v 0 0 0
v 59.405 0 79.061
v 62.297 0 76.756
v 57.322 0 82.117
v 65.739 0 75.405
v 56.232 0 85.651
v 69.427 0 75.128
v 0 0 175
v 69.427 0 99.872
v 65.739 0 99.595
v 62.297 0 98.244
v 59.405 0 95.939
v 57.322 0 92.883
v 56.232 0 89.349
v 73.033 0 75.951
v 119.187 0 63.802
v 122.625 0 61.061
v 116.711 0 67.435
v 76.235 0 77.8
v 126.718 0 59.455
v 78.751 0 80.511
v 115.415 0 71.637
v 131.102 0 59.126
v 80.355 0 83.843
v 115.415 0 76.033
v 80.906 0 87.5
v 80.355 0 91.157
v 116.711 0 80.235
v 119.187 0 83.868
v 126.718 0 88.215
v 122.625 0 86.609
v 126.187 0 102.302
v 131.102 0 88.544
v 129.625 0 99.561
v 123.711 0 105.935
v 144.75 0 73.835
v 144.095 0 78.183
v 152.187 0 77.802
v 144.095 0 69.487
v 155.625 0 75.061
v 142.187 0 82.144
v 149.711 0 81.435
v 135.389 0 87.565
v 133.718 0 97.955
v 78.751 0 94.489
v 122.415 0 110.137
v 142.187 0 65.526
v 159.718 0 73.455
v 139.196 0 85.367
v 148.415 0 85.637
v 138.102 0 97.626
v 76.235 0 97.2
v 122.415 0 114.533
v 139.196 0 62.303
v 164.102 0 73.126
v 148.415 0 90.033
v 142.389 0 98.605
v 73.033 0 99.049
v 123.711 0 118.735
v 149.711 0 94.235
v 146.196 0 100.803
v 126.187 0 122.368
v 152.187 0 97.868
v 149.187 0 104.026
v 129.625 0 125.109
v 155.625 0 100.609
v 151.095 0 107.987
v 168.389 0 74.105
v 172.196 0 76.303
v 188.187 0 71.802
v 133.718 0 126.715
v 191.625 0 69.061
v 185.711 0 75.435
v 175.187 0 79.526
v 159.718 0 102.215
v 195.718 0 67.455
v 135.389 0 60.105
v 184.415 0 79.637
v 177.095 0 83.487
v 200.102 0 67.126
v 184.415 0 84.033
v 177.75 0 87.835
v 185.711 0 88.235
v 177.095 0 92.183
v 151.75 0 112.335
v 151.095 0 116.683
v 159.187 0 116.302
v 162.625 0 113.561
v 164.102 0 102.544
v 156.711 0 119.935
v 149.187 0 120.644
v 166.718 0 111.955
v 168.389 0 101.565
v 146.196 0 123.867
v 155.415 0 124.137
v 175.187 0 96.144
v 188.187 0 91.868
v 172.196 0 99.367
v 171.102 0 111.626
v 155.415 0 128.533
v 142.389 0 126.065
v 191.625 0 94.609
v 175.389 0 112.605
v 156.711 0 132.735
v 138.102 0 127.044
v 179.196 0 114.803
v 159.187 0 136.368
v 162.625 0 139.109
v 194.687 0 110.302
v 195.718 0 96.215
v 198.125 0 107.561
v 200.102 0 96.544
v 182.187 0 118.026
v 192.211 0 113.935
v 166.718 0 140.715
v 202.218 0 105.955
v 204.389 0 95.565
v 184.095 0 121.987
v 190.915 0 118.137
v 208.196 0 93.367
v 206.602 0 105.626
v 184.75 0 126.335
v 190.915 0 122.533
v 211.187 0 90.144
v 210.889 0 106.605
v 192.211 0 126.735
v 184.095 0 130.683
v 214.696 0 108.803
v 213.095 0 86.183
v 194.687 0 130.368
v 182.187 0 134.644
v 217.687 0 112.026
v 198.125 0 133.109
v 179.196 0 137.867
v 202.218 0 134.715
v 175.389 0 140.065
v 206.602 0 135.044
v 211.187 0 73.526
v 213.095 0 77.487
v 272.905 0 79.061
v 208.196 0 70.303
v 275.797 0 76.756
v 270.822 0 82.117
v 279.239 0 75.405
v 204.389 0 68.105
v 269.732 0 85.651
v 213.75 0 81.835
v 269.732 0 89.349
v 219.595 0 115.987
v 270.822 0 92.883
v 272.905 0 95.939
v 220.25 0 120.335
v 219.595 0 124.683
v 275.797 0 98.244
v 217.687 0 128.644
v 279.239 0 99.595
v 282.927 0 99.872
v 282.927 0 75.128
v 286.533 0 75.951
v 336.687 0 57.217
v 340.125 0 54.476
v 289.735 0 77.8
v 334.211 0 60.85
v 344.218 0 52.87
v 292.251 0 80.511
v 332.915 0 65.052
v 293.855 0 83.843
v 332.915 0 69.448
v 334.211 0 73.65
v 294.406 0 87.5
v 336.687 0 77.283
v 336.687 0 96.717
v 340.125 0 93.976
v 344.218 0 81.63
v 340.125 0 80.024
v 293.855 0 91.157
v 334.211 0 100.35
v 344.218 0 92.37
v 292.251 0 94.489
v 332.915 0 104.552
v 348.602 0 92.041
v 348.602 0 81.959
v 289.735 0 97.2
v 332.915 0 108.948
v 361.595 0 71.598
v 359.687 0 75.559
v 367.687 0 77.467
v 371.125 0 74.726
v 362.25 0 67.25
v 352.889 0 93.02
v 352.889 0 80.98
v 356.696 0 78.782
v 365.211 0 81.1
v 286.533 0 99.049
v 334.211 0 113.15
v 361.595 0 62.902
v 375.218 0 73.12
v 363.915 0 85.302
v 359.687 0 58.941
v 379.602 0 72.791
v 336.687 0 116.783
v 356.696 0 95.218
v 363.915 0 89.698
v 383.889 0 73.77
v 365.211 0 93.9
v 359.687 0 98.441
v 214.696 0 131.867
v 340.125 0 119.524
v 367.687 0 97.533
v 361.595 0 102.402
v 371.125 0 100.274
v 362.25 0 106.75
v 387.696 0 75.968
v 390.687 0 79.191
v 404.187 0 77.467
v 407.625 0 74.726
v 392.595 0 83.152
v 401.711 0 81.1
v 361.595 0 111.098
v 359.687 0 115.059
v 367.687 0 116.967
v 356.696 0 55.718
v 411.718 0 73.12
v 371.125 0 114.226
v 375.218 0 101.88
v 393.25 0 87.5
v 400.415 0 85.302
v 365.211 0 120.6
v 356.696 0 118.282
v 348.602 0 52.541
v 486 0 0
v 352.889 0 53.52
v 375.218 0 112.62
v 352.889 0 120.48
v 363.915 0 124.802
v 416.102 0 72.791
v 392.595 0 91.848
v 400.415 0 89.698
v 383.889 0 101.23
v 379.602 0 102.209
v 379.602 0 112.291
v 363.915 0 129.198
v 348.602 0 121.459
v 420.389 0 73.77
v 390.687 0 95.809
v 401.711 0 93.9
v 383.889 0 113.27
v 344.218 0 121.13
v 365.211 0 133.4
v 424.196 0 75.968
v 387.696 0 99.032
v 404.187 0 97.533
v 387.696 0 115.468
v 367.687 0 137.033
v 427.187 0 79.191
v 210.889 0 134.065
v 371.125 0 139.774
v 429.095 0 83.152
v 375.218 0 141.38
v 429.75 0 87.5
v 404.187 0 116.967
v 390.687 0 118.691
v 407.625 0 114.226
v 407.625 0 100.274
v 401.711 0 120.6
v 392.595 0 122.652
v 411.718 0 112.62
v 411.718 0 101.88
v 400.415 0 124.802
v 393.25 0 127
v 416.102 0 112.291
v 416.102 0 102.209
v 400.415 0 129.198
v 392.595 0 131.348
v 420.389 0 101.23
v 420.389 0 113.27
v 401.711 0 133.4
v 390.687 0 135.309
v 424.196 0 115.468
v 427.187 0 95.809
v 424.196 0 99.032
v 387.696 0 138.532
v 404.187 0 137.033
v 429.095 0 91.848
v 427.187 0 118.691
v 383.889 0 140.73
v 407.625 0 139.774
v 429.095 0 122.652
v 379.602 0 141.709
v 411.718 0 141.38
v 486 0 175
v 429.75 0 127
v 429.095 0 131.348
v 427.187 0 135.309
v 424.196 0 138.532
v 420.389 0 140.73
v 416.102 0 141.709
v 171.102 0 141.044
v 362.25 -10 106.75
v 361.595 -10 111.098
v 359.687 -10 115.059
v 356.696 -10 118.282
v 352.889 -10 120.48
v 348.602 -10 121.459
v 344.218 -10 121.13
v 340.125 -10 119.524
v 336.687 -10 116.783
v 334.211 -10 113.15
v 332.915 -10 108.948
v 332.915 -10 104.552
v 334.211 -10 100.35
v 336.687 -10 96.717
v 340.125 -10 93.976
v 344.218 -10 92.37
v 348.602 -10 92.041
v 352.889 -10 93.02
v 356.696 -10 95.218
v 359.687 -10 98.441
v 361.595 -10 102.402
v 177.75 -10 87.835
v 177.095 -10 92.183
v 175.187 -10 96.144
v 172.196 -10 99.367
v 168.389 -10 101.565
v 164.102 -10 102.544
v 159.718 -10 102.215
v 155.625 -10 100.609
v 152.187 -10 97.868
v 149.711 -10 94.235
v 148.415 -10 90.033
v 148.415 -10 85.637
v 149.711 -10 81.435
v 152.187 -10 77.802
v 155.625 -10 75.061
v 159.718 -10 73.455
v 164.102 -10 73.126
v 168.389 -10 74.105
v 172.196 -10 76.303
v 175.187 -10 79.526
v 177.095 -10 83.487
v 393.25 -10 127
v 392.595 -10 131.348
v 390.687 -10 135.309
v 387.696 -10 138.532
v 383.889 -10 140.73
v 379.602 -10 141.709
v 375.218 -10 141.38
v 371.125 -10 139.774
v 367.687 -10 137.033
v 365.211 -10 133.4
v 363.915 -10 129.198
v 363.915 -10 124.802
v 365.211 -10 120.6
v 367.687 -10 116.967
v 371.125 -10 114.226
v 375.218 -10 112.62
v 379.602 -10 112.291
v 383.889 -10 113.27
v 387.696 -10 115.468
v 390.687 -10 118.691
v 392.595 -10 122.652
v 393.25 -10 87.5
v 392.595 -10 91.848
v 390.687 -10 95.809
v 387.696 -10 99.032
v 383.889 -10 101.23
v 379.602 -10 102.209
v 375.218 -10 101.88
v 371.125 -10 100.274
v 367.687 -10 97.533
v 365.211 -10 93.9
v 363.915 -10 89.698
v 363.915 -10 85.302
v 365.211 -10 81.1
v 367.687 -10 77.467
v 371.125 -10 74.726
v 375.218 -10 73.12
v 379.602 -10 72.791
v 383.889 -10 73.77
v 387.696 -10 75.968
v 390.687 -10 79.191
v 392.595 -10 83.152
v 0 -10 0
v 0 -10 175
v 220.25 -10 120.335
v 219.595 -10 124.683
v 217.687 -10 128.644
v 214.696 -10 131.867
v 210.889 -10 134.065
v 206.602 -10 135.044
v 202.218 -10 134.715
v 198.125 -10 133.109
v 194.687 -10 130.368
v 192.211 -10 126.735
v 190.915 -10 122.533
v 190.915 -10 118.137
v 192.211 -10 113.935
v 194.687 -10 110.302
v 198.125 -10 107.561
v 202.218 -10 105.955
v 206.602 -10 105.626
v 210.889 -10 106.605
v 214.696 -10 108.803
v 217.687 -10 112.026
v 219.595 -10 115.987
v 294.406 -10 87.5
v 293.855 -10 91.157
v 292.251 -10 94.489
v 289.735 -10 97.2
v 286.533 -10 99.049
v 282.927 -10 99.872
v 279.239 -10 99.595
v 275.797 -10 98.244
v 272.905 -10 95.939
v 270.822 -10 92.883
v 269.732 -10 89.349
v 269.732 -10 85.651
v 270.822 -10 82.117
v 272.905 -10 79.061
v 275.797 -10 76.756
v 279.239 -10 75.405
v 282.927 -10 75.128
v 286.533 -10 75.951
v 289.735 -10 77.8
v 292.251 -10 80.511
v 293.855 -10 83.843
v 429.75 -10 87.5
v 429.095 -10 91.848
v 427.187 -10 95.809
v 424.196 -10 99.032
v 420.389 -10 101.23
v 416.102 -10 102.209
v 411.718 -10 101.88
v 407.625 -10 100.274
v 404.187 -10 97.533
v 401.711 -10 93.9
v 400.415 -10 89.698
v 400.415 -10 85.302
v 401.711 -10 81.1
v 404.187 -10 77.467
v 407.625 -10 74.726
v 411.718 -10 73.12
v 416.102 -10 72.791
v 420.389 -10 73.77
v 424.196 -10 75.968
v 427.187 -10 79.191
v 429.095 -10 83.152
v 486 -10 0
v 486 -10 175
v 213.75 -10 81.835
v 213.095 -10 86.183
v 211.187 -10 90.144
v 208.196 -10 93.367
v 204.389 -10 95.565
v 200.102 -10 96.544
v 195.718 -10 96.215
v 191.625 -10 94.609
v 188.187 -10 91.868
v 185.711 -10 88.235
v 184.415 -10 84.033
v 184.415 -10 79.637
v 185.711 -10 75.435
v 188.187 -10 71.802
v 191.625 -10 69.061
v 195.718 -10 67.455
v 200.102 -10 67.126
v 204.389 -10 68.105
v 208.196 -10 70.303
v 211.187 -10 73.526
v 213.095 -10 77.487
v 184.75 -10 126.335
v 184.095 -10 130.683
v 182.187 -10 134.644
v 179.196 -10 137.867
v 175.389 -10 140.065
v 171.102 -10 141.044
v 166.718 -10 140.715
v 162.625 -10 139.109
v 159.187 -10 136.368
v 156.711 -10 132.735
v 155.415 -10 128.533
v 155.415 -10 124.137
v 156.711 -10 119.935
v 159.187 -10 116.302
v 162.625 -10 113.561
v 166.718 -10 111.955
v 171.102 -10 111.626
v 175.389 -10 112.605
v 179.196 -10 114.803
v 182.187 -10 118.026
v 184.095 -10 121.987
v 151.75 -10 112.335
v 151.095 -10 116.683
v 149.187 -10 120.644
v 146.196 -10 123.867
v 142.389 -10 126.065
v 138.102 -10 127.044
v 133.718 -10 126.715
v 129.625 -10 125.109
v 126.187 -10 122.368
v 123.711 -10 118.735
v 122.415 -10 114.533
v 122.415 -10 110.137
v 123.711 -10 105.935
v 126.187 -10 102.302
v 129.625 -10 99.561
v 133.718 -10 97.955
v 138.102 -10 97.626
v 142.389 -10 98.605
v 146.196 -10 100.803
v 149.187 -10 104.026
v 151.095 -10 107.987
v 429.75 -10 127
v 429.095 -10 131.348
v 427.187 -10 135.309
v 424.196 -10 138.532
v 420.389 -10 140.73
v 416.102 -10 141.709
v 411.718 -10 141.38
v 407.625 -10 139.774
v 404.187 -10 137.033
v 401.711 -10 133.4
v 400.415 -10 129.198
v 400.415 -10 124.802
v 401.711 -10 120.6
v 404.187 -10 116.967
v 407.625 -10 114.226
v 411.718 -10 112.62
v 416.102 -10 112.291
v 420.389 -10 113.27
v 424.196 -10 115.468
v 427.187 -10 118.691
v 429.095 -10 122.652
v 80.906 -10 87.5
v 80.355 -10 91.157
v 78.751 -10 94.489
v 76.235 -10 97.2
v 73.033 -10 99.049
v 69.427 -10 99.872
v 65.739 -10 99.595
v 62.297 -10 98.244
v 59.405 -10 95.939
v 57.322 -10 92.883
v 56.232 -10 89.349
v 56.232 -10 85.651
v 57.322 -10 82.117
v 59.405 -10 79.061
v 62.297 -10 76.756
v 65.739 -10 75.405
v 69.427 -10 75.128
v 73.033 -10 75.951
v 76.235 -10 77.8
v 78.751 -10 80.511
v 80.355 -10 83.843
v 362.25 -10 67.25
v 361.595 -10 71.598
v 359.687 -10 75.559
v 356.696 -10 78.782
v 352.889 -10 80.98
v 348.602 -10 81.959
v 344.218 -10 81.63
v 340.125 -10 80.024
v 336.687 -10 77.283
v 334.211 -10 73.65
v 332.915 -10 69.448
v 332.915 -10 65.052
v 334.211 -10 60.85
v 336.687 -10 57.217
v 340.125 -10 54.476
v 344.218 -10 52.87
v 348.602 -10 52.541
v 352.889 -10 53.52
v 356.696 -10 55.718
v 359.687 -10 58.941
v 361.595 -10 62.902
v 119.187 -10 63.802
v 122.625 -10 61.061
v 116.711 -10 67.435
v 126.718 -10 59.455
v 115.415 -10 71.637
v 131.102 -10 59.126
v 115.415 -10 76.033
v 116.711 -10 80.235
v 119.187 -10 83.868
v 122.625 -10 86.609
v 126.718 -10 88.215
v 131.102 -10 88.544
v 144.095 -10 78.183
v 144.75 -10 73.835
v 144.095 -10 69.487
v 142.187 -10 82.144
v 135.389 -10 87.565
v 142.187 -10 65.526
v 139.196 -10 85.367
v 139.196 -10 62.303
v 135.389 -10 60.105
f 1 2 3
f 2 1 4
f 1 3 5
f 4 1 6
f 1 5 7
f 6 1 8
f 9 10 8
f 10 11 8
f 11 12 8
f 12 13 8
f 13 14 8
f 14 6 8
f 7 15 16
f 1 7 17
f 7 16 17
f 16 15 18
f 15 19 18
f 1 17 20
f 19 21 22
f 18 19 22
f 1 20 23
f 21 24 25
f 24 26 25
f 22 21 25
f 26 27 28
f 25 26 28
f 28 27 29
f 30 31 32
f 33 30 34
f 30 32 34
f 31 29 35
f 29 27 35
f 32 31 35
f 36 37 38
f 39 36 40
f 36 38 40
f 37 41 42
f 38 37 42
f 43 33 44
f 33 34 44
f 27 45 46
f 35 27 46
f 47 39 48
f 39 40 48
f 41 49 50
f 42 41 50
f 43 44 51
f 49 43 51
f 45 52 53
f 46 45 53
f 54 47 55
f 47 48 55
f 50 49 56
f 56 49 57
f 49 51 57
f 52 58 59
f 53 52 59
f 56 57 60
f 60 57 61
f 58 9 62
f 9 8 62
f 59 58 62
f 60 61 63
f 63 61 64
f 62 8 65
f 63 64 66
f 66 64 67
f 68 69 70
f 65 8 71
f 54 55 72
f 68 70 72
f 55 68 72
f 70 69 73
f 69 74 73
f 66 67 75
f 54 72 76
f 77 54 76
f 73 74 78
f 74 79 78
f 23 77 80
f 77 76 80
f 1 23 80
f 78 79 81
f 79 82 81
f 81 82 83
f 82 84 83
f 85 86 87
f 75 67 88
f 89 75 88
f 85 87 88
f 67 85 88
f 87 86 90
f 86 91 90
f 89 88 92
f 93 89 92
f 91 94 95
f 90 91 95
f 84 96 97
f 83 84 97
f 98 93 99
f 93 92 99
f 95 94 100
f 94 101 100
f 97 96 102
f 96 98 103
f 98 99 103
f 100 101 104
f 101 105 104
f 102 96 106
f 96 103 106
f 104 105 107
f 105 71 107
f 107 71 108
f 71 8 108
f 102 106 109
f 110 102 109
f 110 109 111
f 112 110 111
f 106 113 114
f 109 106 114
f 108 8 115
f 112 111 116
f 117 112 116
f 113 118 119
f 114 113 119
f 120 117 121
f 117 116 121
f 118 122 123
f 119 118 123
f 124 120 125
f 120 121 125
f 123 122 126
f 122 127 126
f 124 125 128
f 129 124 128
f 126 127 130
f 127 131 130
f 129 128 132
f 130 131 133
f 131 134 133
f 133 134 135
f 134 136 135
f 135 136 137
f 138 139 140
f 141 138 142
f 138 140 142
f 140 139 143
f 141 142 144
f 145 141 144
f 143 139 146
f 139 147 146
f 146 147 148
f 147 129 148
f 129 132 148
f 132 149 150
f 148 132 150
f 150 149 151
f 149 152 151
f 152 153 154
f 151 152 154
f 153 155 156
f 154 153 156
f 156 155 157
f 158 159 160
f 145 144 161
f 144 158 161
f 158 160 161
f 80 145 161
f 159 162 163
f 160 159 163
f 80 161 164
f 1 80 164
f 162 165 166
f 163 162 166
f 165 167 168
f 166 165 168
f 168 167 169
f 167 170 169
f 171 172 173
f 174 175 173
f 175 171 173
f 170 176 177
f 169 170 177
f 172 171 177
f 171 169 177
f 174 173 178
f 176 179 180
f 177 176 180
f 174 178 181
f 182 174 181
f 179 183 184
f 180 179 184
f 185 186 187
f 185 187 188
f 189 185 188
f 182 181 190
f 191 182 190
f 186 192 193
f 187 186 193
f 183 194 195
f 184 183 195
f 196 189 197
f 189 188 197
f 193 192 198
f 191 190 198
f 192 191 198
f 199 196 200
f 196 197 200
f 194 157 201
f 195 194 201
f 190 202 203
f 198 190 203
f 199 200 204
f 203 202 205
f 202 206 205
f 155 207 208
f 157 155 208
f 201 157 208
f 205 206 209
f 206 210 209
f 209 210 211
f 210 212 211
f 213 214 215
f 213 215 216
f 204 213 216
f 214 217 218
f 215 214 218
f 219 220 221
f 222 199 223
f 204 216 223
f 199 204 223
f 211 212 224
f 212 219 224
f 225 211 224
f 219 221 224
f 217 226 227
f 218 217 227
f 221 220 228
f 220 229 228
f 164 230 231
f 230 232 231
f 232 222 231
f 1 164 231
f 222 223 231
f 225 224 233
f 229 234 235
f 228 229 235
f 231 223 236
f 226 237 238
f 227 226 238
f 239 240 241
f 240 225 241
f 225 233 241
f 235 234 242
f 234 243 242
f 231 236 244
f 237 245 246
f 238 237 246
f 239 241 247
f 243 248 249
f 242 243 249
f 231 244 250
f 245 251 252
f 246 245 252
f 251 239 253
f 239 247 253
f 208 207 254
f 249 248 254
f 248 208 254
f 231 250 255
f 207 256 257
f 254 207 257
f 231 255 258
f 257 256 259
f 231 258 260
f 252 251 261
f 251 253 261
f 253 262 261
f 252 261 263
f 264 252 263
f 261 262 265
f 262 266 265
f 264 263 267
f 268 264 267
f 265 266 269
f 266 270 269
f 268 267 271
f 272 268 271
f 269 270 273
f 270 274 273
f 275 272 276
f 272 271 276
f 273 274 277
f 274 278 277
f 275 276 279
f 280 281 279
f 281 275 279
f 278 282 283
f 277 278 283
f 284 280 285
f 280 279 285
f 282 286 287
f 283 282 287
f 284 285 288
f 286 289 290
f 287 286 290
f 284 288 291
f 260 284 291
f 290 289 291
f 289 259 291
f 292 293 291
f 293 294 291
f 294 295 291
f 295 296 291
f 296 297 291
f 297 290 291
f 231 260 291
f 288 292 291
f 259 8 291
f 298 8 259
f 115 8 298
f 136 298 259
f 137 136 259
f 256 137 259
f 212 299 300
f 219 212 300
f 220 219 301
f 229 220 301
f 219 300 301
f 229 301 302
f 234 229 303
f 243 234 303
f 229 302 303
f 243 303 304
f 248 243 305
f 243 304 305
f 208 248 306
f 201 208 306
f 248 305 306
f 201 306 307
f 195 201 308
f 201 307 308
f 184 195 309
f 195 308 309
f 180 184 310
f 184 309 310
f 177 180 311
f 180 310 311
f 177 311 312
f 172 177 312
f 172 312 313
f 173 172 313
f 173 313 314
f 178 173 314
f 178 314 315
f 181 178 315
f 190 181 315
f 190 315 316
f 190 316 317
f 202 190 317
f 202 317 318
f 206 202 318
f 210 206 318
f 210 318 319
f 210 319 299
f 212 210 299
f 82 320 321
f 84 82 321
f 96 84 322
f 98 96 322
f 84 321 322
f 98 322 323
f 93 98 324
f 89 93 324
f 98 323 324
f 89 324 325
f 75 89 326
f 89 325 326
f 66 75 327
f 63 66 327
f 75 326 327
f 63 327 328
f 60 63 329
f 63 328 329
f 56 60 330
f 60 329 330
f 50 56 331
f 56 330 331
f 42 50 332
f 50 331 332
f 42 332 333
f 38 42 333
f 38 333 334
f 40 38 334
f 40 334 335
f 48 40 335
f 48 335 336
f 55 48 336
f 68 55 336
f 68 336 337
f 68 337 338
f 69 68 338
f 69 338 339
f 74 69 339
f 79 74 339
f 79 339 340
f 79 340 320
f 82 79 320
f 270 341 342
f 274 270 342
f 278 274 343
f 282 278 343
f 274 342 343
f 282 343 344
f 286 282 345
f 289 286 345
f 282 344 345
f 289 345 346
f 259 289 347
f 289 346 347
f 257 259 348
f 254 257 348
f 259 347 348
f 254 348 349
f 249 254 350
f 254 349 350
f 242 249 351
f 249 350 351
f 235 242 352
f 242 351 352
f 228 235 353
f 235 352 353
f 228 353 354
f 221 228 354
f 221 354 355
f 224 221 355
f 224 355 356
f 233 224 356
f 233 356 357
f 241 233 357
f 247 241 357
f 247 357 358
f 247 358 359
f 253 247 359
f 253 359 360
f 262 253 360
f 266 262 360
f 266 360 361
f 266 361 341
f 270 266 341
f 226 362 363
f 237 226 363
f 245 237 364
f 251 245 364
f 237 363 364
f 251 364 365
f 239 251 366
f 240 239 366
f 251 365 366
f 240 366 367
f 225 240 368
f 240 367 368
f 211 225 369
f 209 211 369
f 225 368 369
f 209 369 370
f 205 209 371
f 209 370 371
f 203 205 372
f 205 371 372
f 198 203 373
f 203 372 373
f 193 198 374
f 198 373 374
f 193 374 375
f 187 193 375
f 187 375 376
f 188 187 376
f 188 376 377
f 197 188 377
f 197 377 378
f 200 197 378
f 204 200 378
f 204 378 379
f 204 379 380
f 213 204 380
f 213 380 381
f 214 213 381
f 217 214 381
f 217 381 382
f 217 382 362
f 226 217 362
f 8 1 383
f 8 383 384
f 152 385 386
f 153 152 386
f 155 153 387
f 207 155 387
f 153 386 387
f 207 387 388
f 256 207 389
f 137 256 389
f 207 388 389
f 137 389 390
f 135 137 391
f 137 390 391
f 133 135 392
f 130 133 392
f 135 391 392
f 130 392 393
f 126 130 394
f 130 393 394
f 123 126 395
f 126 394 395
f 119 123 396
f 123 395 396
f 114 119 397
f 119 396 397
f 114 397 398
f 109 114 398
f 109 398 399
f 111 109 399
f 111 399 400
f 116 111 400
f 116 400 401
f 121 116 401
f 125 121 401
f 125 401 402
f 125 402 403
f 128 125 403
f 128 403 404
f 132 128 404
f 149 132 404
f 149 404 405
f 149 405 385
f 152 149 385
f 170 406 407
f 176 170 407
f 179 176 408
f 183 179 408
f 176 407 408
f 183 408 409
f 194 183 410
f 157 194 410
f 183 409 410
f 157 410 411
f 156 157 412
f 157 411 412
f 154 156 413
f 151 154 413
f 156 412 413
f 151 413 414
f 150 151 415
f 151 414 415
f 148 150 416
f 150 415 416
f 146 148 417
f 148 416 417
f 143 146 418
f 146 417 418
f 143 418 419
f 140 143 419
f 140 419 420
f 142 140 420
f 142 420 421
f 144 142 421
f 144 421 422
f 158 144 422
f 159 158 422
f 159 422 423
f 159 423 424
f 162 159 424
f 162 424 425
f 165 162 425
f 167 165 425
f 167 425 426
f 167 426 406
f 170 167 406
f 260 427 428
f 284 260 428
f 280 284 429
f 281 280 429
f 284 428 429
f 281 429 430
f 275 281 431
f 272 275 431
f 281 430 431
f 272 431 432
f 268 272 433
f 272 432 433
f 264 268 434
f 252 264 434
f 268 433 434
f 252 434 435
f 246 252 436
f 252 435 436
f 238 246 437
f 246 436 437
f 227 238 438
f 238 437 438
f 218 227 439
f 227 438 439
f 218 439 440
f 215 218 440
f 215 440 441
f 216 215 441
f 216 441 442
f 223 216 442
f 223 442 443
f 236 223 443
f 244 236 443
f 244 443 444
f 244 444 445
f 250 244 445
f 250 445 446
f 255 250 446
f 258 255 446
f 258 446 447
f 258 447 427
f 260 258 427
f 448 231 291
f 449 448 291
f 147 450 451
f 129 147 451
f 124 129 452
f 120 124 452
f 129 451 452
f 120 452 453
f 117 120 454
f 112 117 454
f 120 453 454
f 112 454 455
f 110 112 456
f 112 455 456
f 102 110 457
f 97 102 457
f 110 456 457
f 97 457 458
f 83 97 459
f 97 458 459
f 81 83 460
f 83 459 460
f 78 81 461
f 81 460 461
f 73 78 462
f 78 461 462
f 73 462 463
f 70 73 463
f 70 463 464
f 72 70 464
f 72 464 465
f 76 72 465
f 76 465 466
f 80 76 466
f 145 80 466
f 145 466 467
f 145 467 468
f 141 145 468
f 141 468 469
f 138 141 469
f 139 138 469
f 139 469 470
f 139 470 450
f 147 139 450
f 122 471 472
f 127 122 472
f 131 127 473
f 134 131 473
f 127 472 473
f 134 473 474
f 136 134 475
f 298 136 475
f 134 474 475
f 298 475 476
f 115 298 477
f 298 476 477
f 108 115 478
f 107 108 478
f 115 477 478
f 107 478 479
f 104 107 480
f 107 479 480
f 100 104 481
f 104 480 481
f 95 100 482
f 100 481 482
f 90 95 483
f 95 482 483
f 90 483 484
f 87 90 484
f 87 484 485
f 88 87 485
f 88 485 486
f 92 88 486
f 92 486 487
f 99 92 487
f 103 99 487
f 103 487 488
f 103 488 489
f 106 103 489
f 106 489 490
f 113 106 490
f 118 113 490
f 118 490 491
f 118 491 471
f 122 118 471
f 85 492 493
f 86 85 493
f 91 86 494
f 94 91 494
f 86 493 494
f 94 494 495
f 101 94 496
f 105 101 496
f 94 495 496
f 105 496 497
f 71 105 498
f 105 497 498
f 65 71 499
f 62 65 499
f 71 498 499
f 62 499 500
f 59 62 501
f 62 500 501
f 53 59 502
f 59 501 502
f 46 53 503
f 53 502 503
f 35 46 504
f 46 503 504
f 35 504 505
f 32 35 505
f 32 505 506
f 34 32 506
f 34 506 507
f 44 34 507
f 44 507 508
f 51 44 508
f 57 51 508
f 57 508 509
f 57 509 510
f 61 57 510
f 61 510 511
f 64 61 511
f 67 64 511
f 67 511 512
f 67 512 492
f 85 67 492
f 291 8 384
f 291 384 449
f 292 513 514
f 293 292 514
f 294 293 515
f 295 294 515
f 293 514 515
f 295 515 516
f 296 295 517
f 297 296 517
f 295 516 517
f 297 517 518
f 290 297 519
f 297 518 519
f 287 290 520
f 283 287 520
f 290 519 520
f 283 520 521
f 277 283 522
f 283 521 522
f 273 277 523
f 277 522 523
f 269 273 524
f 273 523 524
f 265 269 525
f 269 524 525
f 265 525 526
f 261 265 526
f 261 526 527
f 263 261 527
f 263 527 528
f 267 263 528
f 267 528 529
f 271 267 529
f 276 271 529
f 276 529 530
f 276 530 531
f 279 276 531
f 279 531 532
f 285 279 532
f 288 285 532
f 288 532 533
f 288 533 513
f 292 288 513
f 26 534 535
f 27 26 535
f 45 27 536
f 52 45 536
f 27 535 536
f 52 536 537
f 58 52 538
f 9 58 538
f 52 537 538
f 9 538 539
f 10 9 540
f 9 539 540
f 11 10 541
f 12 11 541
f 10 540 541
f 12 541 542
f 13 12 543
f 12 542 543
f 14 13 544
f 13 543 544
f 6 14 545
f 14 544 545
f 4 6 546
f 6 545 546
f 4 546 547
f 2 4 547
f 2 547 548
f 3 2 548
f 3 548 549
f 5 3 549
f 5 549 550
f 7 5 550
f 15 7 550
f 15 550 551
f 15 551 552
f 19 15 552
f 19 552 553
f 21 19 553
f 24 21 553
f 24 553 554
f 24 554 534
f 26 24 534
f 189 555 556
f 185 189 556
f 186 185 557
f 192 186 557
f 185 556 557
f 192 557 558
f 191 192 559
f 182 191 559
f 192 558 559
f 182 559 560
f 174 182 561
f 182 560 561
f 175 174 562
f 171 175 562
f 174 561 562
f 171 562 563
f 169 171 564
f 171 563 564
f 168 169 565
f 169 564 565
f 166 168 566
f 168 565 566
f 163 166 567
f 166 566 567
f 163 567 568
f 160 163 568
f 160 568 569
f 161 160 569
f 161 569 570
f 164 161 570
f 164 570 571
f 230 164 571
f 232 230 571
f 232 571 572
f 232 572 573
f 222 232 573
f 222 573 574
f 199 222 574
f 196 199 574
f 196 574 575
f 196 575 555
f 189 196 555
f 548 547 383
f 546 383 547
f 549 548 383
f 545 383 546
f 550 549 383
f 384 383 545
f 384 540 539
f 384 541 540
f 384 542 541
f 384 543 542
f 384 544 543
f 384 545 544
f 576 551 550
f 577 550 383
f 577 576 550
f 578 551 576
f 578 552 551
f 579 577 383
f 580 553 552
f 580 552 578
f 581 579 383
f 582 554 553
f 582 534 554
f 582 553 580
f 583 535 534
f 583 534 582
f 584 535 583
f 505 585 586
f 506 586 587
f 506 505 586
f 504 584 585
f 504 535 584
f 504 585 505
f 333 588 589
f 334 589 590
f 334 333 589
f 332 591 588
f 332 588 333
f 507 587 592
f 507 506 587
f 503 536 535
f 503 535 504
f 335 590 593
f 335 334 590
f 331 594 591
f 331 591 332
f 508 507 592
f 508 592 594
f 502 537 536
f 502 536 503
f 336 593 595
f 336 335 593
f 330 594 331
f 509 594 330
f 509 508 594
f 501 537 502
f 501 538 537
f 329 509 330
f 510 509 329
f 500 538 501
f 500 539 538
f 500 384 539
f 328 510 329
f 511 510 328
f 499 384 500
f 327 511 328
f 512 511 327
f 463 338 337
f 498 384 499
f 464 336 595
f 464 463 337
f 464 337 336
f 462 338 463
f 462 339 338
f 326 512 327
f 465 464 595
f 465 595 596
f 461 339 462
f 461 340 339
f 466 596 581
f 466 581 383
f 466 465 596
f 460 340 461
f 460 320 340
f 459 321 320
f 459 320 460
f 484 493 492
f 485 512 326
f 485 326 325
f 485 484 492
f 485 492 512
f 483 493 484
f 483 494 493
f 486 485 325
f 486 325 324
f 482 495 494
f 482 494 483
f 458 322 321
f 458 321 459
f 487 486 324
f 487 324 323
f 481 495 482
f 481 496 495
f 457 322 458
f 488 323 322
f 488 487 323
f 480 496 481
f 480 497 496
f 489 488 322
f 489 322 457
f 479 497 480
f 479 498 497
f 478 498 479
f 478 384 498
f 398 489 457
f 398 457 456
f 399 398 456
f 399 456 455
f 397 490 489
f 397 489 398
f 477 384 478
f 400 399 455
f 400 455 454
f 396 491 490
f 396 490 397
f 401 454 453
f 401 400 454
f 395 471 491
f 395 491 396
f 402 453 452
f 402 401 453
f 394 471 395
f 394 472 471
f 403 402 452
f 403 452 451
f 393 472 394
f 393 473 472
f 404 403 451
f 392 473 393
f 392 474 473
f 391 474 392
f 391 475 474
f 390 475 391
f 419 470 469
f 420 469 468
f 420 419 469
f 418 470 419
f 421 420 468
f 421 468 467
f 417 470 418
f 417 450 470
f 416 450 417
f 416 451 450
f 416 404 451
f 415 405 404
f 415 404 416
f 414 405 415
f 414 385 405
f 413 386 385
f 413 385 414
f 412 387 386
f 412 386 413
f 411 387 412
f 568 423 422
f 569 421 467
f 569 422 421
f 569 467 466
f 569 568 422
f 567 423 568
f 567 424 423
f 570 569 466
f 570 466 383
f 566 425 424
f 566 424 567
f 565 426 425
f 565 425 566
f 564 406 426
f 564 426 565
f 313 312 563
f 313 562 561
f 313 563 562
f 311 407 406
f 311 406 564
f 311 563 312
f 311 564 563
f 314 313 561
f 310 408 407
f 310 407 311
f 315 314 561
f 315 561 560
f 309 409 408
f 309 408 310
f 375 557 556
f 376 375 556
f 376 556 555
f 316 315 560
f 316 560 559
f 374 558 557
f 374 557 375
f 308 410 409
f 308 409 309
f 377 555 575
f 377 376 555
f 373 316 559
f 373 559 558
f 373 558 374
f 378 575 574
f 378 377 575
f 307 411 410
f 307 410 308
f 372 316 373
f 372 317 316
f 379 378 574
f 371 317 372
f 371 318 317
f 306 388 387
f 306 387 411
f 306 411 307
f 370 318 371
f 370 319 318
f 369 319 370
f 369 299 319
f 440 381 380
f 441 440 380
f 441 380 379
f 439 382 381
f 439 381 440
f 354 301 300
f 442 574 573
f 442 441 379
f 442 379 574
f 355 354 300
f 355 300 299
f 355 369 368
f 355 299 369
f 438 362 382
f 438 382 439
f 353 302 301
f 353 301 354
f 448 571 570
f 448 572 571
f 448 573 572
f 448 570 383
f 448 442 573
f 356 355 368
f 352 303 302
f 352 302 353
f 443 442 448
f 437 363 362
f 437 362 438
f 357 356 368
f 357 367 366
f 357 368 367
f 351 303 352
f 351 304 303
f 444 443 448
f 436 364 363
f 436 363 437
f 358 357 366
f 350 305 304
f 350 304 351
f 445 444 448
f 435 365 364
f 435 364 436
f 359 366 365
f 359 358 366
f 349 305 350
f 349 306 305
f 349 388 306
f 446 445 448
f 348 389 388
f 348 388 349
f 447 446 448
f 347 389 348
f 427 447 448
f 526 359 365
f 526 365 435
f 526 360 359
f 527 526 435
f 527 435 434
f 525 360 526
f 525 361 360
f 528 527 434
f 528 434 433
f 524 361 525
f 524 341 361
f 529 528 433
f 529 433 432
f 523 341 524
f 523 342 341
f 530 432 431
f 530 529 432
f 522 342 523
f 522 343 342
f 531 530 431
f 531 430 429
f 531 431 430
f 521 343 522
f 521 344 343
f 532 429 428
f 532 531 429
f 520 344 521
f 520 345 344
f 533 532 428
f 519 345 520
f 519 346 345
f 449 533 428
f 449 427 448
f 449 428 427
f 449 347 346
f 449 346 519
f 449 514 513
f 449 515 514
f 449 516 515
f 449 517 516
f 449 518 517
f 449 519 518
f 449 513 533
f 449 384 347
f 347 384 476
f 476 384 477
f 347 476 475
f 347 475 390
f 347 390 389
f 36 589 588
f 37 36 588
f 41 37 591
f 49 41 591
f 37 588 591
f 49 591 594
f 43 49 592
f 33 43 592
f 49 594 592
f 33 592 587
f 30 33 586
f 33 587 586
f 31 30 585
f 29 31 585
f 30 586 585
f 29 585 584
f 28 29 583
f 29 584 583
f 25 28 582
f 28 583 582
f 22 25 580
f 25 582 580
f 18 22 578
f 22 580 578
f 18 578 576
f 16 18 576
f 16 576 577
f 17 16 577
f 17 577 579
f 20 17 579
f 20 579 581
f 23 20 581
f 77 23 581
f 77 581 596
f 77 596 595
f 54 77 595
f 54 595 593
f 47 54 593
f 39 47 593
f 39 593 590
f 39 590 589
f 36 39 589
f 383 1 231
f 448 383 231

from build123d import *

# Parameters (mm, degrees)
F0_W     = 486
F0_H     = 175
F1_DEPTH = 10
F5_R     = 14.75
F5_R_2   = 12.4064380464
F7_DEPTH = 25
F3_R     = 14.75
F3_R_2   = 12.4065
F8_DEPTH = 25


# Not quite as in the source:
# - a feature names something its author has since deleted; it is built from what else it names


with BuildPart() as f1:
    # F0 (on Front) → F1 (new body)
    with BuildSketch(Plane.XZ):
        with Locations((243, 87.5)):
            Rectangle(F0_W, F0_H)
    extrude(amount=F1_DEPTH)

    # F5 (on face) → F7 (cut)
    with BuildSketch(Plane.XZ.offset(10)):
        with Locations((347.5, 106.75)):
            Circle(F5_R)
        with Locations((378.5, 127)):
            Circle(F5_R)
        with Locations((415, 127)):
            Circle(F5_R)
        with Locations((415, 87.5)):
            Circle(F5_R)
        with Locations((378.5, 87.5)):
            Circle(F5_R)
        with Locations((347.5, 67.25)):
            Circle(F5_R)
        with Locations((282, 87.5)):
            Circle(F5_R_2)
    extrude(amount=-F7_DEPTH, mode=Mode.SUBTRACT)

    # F3 (on face) → F8 (cut)
    with BuildSketch(Plane.XZ.offset(10)):
        with Locations((170, 126.3350188136)):
            Circle(F3_R)
        with Locations((205.5, 120.3350188136)):
            Circle(F3_R)
        with Locations((199, 81.8350188136)):
            Circle(F3_R)
        with Locations((163, 87.8350188136)):
            Circle(F3_R)
        with Locations((130, 73.8350188136)):
            Circle(F3_R)
        with Locations((137, 112.3350188136)):
            Circle(F3_R)
        with Locations((68.5, 87.5)):
            Circle(F3_R_2)
    extrude(amount=-F8_DEPTH, mode=Mode.SUBTRACT)


solid = f1.part
